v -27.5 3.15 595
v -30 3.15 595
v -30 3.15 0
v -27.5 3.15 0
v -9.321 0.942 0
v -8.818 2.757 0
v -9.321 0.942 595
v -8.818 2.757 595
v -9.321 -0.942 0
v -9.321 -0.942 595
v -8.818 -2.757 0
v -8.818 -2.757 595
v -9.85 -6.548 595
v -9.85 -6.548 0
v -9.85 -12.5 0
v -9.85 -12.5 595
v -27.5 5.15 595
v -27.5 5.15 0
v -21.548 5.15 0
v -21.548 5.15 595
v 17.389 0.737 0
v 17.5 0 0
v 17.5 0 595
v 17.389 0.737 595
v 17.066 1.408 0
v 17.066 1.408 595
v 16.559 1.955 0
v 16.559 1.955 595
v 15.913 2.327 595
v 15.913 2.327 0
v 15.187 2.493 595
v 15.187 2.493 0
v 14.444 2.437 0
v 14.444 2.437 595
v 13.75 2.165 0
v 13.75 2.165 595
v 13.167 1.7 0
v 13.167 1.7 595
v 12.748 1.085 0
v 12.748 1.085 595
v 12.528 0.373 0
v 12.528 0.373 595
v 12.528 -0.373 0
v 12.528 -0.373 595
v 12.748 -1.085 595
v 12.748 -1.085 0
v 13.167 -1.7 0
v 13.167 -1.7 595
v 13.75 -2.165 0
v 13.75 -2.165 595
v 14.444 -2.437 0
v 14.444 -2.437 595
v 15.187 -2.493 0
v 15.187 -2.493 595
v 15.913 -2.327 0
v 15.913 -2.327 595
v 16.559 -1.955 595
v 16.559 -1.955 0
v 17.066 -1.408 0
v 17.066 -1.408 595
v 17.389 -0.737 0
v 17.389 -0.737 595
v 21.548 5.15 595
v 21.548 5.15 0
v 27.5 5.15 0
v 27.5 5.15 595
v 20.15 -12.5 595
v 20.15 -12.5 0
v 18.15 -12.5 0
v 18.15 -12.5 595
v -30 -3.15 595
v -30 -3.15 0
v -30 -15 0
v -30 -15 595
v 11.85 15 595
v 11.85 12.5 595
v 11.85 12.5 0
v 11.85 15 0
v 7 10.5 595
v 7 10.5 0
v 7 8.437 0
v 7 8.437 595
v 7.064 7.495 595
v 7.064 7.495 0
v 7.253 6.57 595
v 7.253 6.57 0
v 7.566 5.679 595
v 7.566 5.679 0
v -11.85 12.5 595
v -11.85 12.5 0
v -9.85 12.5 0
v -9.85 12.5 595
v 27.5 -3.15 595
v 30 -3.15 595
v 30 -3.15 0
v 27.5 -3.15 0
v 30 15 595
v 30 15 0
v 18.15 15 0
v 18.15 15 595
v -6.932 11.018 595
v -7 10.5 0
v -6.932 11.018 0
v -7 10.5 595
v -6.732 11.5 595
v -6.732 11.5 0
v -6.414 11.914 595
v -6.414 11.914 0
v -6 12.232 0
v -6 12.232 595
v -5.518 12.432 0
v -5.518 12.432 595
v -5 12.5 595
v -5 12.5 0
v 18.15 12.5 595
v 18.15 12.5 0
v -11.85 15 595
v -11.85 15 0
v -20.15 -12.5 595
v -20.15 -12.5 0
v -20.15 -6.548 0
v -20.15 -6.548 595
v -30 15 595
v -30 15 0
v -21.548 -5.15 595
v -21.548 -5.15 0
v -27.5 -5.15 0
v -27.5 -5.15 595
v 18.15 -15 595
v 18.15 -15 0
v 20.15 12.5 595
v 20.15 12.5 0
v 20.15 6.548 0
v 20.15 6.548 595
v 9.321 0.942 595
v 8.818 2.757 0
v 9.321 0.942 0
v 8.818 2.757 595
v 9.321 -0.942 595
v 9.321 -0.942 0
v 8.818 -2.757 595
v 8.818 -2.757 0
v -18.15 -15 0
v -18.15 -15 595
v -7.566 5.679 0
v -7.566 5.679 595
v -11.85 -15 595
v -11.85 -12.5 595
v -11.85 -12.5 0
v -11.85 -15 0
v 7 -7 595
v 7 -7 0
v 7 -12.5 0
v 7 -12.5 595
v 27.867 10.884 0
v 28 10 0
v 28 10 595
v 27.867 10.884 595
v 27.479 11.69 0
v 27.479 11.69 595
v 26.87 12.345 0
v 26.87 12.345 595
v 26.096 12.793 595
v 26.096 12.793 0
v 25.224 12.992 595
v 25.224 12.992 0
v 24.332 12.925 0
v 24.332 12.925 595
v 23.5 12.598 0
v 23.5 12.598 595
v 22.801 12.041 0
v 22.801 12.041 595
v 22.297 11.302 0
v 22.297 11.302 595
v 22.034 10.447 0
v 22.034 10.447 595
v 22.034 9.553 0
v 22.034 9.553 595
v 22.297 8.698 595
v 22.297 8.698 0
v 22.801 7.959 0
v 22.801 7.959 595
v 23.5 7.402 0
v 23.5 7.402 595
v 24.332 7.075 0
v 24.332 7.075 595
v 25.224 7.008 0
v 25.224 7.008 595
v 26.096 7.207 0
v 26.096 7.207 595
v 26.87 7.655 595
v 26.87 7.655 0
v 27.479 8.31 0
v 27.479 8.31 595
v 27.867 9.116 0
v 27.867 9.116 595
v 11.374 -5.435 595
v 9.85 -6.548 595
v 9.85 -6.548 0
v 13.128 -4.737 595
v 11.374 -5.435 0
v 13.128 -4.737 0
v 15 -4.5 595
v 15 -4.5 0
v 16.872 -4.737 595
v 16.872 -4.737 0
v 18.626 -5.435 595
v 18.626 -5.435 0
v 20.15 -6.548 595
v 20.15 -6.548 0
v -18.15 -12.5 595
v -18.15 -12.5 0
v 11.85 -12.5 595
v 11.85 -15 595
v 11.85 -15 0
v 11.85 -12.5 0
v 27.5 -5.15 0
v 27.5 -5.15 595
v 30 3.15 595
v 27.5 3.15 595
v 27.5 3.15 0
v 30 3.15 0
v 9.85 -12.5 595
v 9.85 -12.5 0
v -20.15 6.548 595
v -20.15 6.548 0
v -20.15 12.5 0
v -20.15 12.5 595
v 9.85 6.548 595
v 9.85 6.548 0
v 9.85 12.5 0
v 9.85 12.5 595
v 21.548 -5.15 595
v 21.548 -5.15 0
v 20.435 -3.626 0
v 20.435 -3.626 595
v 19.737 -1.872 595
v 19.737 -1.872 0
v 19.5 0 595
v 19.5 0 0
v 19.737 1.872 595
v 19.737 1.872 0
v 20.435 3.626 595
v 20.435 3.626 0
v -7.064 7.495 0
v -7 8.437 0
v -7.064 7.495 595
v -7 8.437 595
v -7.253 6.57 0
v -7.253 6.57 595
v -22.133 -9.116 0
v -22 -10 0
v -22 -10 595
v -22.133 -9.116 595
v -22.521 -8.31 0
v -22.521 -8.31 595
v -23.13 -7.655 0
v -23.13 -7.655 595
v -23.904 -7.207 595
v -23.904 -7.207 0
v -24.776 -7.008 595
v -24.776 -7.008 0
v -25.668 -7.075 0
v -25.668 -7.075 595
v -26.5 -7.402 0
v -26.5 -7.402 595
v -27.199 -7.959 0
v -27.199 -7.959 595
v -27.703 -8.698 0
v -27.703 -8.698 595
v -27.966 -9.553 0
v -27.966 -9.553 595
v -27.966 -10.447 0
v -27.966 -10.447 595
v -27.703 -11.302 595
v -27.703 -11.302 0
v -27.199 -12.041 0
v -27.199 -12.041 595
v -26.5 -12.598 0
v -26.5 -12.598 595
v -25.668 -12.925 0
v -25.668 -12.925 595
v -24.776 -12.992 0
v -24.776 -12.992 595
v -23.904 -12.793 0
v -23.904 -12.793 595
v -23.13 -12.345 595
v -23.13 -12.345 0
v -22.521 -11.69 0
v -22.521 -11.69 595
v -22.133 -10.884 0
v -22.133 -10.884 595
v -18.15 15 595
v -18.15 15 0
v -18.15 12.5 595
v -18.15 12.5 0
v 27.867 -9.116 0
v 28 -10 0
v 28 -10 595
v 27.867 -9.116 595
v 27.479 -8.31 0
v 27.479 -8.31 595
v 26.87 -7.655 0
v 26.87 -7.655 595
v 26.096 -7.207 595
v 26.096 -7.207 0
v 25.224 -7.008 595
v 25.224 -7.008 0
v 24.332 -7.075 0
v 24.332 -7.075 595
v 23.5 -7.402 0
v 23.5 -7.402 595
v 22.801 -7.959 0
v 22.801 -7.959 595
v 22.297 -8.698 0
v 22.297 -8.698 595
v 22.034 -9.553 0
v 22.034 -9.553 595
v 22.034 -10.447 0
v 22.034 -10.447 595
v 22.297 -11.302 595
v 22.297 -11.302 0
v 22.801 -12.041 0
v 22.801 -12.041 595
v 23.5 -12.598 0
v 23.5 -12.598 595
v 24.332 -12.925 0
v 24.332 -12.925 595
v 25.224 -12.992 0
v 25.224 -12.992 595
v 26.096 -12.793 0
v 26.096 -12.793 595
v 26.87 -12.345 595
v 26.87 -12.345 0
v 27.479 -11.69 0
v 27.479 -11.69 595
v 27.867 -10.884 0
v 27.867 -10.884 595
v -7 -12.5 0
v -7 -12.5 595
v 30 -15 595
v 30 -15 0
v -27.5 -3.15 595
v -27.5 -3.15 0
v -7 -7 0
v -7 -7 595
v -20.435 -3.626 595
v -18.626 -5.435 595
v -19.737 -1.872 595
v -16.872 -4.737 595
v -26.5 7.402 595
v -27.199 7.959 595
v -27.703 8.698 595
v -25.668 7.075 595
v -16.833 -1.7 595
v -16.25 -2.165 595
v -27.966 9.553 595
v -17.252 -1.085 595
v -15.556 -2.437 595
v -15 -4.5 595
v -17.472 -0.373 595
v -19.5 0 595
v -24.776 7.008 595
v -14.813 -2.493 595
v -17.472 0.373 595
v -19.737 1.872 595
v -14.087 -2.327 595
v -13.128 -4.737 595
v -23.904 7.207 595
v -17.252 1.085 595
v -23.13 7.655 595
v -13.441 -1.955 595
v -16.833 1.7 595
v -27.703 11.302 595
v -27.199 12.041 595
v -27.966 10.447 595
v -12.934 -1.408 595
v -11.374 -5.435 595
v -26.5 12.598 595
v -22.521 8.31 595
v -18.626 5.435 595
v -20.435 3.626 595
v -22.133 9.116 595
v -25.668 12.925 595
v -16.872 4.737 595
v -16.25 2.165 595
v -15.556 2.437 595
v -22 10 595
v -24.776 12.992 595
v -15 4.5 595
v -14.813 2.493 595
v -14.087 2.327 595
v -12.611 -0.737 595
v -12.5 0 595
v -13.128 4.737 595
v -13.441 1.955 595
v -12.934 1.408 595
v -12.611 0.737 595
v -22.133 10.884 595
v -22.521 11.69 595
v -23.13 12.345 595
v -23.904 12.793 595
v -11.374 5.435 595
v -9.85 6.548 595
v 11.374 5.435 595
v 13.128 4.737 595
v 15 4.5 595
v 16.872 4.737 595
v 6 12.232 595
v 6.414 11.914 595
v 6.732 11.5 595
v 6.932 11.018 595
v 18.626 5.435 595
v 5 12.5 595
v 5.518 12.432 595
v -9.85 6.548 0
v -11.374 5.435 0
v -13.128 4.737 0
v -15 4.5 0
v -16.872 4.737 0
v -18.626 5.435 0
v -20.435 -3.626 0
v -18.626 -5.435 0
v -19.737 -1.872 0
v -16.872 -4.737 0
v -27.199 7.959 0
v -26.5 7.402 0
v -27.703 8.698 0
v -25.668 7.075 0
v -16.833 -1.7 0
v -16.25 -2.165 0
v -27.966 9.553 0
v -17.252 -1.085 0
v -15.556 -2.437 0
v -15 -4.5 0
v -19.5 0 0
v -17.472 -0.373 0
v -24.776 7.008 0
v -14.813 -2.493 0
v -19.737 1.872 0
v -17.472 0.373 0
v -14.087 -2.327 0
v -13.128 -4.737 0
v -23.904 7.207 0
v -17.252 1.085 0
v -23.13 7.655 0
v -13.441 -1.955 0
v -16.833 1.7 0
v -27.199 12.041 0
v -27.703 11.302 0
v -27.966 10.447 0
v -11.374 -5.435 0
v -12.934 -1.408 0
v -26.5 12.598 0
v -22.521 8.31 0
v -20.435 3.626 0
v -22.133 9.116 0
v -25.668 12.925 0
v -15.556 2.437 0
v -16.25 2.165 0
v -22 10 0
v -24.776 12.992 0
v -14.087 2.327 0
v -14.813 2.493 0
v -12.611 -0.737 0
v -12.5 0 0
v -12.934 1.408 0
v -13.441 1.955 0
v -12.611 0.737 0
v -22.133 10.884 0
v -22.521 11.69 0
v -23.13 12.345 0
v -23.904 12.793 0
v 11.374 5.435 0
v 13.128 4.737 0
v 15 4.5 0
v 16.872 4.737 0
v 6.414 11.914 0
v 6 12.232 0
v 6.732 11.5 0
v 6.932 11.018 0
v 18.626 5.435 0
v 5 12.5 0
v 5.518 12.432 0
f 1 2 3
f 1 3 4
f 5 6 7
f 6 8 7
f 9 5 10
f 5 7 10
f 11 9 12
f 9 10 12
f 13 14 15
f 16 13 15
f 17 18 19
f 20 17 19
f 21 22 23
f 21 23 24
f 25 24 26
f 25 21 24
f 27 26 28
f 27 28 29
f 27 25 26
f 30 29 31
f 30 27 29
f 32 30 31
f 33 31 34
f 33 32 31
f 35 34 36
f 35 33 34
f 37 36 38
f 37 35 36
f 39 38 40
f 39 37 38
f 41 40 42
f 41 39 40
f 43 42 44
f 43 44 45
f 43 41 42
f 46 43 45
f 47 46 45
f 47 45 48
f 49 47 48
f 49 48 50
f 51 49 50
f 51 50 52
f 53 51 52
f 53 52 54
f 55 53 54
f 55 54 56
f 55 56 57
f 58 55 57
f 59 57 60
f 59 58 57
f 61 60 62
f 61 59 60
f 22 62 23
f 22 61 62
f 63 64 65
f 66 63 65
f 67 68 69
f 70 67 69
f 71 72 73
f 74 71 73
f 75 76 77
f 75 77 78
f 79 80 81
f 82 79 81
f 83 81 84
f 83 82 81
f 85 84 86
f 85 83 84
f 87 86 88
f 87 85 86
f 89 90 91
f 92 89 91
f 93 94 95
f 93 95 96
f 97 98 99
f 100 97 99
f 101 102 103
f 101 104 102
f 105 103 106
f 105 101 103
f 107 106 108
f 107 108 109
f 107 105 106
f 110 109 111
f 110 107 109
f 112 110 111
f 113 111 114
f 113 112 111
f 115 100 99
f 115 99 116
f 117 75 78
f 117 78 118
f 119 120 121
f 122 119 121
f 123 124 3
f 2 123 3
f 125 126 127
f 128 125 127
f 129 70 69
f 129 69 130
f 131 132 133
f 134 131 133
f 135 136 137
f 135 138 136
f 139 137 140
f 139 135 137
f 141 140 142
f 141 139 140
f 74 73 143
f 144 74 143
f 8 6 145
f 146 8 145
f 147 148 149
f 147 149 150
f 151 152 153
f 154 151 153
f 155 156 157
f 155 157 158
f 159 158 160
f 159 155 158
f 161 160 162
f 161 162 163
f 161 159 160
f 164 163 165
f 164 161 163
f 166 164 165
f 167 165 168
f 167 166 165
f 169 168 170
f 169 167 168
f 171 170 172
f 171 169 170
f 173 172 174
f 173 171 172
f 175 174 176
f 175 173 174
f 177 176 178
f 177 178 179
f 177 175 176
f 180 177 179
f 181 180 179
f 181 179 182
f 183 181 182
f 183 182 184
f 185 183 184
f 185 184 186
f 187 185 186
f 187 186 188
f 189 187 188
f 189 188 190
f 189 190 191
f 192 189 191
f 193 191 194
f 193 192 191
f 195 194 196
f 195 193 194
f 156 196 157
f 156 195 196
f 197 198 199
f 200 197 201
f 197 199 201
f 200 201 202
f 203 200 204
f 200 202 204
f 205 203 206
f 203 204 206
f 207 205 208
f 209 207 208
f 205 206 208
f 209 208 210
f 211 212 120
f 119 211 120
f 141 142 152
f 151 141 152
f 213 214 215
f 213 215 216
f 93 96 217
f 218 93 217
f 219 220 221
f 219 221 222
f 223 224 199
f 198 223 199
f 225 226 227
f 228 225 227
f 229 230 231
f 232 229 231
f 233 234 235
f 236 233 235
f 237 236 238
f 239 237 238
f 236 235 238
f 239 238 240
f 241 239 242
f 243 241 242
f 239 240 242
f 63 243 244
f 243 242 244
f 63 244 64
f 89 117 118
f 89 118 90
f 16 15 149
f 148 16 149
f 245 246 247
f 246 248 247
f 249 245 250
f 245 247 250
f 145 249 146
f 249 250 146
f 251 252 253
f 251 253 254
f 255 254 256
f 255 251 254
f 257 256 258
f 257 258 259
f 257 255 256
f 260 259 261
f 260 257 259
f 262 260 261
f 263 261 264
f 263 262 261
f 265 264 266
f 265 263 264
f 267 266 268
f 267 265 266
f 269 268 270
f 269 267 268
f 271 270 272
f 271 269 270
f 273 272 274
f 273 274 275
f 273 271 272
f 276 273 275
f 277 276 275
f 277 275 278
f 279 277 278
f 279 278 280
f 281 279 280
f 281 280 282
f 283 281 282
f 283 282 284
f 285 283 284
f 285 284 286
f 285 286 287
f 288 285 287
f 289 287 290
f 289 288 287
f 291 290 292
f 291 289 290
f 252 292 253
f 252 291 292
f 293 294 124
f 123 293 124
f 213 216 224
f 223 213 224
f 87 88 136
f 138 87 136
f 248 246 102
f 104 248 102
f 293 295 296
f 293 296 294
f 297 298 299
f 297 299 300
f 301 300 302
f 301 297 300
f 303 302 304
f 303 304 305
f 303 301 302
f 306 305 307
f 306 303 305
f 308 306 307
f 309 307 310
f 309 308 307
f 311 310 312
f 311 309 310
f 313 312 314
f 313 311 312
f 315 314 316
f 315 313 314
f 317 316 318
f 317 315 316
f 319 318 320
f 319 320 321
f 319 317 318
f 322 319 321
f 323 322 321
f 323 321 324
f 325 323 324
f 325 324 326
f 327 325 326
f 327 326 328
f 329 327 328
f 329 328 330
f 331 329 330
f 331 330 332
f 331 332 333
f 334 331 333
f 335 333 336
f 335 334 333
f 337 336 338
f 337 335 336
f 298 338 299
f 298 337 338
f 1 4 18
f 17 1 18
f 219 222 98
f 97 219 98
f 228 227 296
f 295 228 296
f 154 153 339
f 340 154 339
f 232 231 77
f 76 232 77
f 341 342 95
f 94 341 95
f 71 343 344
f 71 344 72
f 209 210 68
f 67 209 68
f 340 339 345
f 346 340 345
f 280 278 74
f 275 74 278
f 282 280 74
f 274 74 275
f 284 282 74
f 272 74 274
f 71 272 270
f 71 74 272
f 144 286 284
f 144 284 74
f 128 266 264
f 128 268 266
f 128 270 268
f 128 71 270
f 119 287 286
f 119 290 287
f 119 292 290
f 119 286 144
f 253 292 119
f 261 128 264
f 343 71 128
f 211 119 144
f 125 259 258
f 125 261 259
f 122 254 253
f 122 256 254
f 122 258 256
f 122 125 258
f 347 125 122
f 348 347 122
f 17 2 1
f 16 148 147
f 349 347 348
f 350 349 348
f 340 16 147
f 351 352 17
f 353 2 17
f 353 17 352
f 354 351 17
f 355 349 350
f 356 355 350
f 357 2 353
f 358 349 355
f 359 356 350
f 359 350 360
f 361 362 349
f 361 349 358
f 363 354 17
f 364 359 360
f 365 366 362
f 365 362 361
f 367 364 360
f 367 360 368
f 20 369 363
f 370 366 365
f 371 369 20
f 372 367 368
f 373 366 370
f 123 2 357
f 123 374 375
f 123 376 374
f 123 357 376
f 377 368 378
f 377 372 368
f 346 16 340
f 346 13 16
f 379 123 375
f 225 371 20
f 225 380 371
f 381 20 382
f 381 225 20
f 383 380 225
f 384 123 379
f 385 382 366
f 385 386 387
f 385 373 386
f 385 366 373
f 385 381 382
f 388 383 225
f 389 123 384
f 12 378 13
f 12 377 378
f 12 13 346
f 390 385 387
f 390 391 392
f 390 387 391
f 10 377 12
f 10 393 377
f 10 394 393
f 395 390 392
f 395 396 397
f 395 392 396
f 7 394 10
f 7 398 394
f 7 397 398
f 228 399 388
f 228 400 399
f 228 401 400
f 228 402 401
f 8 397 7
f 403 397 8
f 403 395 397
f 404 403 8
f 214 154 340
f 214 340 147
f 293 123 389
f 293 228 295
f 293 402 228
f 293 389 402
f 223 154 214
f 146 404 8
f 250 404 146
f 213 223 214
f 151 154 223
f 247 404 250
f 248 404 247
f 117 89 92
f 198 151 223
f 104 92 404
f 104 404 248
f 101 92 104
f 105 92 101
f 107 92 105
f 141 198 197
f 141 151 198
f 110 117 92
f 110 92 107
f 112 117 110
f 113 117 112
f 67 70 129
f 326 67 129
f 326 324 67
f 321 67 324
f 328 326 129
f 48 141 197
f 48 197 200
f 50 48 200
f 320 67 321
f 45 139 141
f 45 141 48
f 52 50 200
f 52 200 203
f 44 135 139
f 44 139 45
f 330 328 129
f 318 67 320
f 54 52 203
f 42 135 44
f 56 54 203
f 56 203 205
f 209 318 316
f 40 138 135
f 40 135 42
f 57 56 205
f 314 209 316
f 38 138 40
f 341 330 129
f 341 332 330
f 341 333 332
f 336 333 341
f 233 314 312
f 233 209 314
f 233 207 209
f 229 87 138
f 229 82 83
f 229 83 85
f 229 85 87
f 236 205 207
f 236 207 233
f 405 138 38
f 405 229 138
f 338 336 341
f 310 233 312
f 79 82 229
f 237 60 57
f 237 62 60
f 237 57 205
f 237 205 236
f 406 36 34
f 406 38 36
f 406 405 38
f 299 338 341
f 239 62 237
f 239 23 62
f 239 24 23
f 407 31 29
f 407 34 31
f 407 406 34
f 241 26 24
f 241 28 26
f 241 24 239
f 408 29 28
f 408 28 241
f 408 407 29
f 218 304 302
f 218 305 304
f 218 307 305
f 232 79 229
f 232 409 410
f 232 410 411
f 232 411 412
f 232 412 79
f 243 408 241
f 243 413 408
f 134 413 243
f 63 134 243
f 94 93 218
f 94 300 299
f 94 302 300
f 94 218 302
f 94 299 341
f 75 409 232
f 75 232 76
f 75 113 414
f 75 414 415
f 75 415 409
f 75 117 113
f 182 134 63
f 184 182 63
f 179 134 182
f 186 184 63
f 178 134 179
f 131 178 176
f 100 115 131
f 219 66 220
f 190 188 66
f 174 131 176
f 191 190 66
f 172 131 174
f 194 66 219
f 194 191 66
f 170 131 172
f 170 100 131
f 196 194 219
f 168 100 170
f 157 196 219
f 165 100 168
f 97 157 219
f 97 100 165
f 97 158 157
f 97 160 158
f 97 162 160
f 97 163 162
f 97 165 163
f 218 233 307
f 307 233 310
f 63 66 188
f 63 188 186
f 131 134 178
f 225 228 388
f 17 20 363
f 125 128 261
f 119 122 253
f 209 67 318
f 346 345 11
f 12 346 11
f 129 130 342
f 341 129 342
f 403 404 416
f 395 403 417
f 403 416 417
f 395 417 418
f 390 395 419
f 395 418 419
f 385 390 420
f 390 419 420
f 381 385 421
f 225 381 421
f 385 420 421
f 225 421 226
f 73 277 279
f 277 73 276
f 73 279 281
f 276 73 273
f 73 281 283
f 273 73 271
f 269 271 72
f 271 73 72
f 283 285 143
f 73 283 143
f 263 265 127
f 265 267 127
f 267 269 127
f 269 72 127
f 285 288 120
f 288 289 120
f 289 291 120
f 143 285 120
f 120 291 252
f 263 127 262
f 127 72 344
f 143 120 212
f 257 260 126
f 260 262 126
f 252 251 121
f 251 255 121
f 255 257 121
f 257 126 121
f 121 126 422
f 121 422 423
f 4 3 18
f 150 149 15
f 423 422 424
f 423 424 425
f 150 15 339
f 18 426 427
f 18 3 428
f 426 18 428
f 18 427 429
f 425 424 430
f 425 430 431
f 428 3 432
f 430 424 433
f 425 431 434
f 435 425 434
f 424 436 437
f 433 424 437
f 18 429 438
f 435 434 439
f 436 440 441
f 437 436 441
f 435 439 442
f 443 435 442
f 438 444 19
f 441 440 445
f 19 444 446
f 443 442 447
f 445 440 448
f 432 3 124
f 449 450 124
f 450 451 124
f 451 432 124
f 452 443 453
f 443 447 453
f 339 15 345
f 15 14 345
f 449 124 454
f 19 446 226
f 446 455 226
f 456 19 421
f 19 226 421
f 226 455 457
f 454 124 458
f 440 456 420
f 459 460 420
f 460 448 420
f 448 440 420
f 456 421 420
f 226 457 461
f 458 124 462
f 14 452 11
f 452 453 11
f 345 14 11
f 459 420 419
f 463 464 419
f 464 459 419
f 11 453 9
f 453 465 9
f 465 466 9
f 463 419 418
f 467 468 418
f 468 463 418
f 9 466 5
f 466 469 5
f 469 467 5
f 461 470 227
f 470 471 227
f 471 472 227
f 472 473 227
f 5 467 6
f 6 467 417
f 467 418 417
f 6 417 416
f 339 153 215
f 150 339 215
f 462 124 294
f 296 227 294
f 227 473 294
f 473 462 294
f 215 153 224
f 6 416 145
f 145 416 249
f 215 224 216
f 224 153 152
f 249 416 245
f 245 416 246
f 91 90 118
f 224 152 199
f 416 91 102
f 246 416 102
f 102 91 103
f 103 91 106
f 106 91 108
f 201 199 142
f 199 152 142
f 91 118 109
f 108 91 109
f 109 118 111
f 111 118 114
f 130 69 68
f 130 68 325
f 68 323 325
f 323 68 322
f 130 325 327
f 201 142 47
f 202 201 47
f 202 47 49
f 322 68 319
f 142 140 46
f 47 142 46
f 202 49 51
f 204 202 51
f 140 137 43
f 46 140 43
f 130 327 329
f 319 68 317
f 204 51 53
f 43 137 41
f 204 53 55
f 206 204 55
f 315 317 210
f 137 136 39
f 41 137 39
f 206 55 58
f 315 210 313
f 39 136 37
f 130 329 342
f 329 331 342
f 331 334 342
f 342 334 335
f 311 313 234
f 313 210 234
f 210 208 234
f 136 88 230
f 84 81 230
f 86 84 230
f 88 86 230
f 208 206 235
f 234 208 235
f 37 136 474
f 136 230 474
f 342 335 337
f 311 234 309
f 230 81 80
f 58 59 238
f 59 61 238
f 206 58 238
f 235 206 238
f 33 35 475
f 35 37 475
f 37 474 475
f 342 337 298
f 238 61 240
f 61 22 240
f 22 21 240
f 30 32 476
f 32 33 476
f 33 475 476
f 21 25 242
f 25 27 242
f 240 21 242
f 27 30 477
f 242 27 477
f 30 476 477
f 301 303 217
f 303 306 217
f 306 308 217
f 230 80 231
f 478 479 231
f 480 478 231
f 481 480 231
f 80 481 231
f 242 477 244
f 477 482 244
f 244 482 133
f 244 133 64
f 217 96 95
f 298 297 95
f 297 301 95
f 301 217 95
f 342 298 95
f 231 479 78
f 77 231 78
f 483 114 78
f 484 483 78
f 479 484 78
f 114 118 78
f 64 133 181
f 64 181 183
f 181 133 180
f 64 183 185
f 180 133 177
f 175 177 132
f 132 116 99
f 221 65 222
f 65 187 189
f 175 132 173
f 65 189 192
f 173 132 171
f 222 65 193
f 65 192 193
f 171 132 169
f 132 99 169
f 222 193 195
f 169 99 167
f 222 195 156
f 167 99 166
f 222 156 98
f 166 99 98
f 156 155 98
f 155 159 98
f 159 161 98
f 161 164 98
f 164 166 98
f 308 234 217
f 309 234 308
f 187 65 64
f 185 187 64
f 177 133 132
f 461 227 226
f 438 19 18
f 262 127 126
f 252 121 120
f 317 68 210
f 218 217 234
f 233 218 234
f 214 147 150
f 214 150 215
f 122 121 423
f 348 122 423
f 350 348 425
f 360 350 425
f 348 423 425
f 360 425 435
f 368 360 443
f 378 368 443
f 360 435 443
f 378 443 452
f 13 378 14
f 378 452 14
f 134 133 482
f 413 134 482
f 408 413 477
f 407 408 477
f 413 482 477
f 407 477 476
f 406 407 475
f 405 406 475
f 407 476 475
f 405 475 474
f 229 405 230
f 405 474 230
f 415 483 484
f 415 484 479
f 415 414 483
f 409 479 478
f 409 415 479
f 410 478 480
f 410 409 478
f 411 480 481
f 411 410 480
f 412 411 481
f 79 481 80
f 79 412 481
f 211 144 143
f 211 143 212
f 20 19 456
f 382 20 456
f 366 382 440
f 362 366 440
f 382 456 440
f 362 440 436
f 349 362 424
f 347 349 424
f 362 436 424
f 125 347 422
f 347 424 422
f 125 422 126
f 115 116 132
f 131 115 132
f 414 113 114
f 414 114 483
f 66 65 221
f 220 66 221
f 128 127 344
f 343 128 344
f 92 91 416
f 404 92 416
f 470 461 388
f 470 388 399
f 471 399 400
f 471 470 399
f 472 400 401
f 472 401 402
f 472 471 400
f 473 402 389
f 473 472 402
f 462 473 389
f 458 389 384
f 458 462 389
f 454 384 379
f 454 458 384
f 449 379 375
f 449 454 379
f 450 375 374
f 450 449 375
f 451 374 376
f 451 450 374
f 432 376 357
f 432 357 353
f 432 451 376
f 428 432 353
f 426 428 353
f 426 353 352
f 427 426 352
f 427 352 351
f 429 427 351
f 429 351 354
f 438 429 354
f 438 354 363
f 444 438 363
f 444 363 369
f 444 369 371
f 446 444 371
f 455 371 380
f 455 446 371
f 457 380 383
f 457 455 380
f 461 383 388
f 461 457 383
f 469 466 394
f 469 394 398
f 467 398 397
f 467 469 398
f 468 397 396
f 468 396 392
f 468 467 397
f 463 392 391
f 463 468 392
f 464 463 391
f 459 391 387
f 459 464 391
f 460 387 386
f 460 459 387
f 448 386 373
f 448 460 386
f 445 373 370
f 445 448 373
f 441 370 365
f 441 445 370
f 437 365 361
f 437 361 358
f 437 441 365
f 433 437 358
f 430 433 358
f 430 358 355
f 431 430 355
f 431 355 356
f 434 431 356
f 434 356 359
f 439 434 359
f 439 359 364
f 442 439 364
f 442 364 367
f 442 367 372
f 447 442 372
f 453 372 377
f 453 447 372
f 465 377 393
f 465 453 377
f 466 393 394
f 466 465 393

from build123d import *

# Parameters (mm, degrees)
F0_R     = 3
F0_R_2   = 2.5
F1_DEPTH = 595
F2_R     = 2
F3_R     = 7


# Not quite as in the source:
# - a feature names something its author has since deleted; it is built from what else it names


with BuildPart() as f1:
    # F0 (on Top) → F1 (new body)
    with BuildSketch(Plane.XY):
        with BuildLine():
            Line((18.15, -15), (30, -15))
            Line((30, -15), (30, -3.15))
            Line((30, -3.15), (27.5, -3.15))
            Line((27.5, -3.15), (27.5, -5.15))
            Line((27.5, -5.15), (21.5477069044, -5.15))
            ThreePointArc((21.5477069044, -5.15), (19.5, 0), (21.5477069044, 5.15))
            Line((21.5477069044, 5.15), (27.5, 5.15))
            Line((27.5, 5.15), (27.5, 3.15))
            Line((27.5, 3.15), (30, 3.15))
            Line((30, 3.15), (30, 15))
            Line((30, 15), (18.15, 15))
            Line((18.15, 15), (18.15, 12.5))
            Line((18.15, 12.5), (20.15, 12.5))
            Line((20.15, 12.5), (20.15, 6.5477069044))
            ThreePointArc((20.15, 6.5477069044), (15, 4.5), (9.85, 6.5477069044))
            Line((9.85, 6.5477069044), (9.85, 12.5))
            Line((9.85, 12.5), (11.85, 12.5))
            Line((11.85, 12.5), (11.85, 15))
            Line((11.85, 15), (-11.85, 15))
            Line((-11.85, 15), (-11.85, 12.5))
            Line((-11.85, 12.5), (-9.85, 12.5))
            Line((-9.85, 12.5), (-9.85, 6.5477069044))
            ThreePointArc((-9.85, 6.5477069044), (-15, 4.5), (-20.15, 6.5477069044))
            Line((-20.15, 6.5477069044), (-20.15, 12.5))
            Line((-20.15, 12.5), (-18.15, 12.5))
            Line((-18.15, 12.5), (-18.15, 15))
            Line((-18.15, 15), (-30, 15))
            Line((-30, 15), (-30, 3.15))
            Line((-30, 3.15), (-27.5, 3.15))
            Line((-27.5, 3.15), (-27.5, 5.15))
            Line((-27.5, 5.15), (-21.5477069044, 5.15))
            ThreePointArc((-21.5477069044, 5.15), (-19.5, 0), (-21.5477069044, -5.15))
            Line((-21.5477069044, -5.15), (-27.5, -5.15))
            Line((-27.5, -5.15), (-27.5, -3.15))
            Line((-27.5, -3.15), (-30, -3.15))
            Line((-30, -3.15), (-30, -15))
            Line((-30, -15), (-18.15, -15))
            Line((-18.15, -15), (-18.15, -12.5))
            Line((-18.15, -12.5), (-20.15, -12.5))
            Line((-20.15, -12.5), (-20.15, -6.5477069044))
            ThreePointArc((-20.15, -6.5477069044), (-15, -4.5), (-9.85, -6.5477069044))
            Line((-9.85, -6.5477069044), (-9.85, -12.5))
            Line((-9.85, -12.5), (-11.85, -12.5))
            Line((-11.85, -12.5), (-11.85, -15))
            Line((-11.85, -15), (11.85, -15))
            Line((11.85, -15), (11.85, -12.5))
            Line((11.85, -12.5), (9.85, -12.5))
            Line((9.85, -12.5), (9.85, -6.5477069044))
            ThreePointArc((9.85, -6.5477069044), (15, -4.5), (20.15, -6.5477069044))
            Line((20.15, -6.5477069044), (20.15, -12.5))
            Line((20.15, -12.5), (18.15, -12.5))
            Line((18.15, -12.5), (18.15, -15))
        make_face()
        with Locations((-25, -10)):
            Circle(F0_R, mode=Mode.SUBTRACT)
        with Locations((25, -10)):
            Circle(F0_R, mode=Mode.SUBTRACT)
        with Locations((-15, 0)):
            Circle(F0_R_2, mode=Mode.SUBTRACT)
        with Locations((-25, 10)):
            Circle(F0_R, mode=Mode.SUBTRACT)
        Polygon((-7, 7), (-7, 12.5), (0, 12.5), (7, 12.5), (7, 7), (10, 0), (7, -7), (7, -12.5), (0, -12.5), (-7, -12.5), (-7, -7), (-10, 0), align=None, mode=Mode.SUBTRACT)
        with Locations((15, 0)):
            Circle(F0_R_2, mode=Mode.SUBTRACT)
        with Locations((25, 10)):
            Circle(F0_R, mode=Mode.SUBTRACT)
    extrude(amount=F1_DEPTH)

    # F2
    f2_edges = [f1.edges().sort_by_distance(p)[0] for p in [
        (-7, 12.5, 297.5),
        (7, 12.5, 297.5),
    ]]
    fillet(f2_edges, radius=F2_R)

    # F3
    f3_edges = [f1.edges().sort_by_distance(p)[0] for p in [
        (-7, 7, 297.5),
        (-10, 0, 297.5),
        (7, 7, 297.5),
        (10, 0, 297.5),
    ]]
    fillet(f3_edges, radius=F3_R)


solid = f1.part
